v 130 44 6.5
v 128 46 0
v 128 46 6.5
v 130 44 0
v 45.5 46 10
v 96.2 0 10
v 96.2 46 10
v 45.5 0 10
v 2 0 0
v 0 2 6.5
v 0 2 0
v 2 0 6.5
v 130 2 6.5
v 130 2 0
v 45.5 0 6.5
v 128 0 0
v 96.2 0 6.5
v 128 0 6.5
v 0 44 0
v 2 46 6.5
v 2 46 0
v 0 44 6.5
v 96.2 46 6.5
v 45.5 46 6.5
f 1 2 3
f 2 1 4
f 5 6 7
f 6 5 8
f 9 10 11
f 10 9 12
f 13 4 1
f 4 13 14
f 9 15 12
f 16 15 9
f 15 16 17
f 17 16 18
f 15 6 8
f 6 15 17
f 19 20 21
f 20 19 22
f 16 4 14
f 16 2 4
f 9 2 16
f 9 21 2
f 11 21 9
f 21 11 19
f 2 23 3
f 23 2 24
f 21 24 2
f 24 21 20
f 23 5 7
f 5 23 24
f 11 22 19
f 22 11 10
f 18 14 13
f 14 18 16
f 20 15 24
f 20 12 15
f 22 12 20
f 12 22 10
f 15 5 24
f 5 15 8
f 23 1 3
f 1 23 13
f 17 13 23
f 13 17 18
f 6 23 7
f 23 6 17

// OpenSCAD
$fn = 32;

// ----------------------------------------------------------------------
// Stepped bar: centerstep, 130 x 46 x 10/6.5 mm
// ----------------------------------------------------------------------

// --- parameters (mm) ---
bar_l = 130;              // bar length, X
bar_w = 46;               // bar width, Y
plate_t = 10;             // thickness of the thick zone, Z
thin_t = 6.5;             // thickness of the thin zone
corner_c = 2;             // corner chamfer of the bar
step_cut = 3.5;           // material removed from the thin zone
thick_from = 45.5;        // start of the thick middle zone
thick_to = 96.2;          // end of the thick middle zone
depth_1 = 3.5;            // depth of cut 1 from the top face
depth_2 = 3.5;            // depth of cut 2 from the top face

profile = [[2, 0], [128, 0], [130, 2], [130, 44], [128, 46], [2, 46], [0, 44], [0, 2]];  // primary outline, 8 points, counter clockwise
void_1 = [[-1, -1], [45.5, -1], [45.5, 47], [-1, 47]];  // thin left end, 4 points
void_2 = [[96.2, -1], [131, -1], [131, 47], [96.2, 47]];  // thin right end, 4 points

// --- the one profile operation ---
difference() {
  linear_extrude(height = plate_t) polygon(points = profile);
  translate([0, 0, plate_t - depth_1])
    linear_extrude(height = depth_1 + 1) polygon(points = void_1);
  translate([0, 0, plate_t - depth_2])
    linear_extrude(height = depth_2 + 1) polygon(points = void_2);
}
